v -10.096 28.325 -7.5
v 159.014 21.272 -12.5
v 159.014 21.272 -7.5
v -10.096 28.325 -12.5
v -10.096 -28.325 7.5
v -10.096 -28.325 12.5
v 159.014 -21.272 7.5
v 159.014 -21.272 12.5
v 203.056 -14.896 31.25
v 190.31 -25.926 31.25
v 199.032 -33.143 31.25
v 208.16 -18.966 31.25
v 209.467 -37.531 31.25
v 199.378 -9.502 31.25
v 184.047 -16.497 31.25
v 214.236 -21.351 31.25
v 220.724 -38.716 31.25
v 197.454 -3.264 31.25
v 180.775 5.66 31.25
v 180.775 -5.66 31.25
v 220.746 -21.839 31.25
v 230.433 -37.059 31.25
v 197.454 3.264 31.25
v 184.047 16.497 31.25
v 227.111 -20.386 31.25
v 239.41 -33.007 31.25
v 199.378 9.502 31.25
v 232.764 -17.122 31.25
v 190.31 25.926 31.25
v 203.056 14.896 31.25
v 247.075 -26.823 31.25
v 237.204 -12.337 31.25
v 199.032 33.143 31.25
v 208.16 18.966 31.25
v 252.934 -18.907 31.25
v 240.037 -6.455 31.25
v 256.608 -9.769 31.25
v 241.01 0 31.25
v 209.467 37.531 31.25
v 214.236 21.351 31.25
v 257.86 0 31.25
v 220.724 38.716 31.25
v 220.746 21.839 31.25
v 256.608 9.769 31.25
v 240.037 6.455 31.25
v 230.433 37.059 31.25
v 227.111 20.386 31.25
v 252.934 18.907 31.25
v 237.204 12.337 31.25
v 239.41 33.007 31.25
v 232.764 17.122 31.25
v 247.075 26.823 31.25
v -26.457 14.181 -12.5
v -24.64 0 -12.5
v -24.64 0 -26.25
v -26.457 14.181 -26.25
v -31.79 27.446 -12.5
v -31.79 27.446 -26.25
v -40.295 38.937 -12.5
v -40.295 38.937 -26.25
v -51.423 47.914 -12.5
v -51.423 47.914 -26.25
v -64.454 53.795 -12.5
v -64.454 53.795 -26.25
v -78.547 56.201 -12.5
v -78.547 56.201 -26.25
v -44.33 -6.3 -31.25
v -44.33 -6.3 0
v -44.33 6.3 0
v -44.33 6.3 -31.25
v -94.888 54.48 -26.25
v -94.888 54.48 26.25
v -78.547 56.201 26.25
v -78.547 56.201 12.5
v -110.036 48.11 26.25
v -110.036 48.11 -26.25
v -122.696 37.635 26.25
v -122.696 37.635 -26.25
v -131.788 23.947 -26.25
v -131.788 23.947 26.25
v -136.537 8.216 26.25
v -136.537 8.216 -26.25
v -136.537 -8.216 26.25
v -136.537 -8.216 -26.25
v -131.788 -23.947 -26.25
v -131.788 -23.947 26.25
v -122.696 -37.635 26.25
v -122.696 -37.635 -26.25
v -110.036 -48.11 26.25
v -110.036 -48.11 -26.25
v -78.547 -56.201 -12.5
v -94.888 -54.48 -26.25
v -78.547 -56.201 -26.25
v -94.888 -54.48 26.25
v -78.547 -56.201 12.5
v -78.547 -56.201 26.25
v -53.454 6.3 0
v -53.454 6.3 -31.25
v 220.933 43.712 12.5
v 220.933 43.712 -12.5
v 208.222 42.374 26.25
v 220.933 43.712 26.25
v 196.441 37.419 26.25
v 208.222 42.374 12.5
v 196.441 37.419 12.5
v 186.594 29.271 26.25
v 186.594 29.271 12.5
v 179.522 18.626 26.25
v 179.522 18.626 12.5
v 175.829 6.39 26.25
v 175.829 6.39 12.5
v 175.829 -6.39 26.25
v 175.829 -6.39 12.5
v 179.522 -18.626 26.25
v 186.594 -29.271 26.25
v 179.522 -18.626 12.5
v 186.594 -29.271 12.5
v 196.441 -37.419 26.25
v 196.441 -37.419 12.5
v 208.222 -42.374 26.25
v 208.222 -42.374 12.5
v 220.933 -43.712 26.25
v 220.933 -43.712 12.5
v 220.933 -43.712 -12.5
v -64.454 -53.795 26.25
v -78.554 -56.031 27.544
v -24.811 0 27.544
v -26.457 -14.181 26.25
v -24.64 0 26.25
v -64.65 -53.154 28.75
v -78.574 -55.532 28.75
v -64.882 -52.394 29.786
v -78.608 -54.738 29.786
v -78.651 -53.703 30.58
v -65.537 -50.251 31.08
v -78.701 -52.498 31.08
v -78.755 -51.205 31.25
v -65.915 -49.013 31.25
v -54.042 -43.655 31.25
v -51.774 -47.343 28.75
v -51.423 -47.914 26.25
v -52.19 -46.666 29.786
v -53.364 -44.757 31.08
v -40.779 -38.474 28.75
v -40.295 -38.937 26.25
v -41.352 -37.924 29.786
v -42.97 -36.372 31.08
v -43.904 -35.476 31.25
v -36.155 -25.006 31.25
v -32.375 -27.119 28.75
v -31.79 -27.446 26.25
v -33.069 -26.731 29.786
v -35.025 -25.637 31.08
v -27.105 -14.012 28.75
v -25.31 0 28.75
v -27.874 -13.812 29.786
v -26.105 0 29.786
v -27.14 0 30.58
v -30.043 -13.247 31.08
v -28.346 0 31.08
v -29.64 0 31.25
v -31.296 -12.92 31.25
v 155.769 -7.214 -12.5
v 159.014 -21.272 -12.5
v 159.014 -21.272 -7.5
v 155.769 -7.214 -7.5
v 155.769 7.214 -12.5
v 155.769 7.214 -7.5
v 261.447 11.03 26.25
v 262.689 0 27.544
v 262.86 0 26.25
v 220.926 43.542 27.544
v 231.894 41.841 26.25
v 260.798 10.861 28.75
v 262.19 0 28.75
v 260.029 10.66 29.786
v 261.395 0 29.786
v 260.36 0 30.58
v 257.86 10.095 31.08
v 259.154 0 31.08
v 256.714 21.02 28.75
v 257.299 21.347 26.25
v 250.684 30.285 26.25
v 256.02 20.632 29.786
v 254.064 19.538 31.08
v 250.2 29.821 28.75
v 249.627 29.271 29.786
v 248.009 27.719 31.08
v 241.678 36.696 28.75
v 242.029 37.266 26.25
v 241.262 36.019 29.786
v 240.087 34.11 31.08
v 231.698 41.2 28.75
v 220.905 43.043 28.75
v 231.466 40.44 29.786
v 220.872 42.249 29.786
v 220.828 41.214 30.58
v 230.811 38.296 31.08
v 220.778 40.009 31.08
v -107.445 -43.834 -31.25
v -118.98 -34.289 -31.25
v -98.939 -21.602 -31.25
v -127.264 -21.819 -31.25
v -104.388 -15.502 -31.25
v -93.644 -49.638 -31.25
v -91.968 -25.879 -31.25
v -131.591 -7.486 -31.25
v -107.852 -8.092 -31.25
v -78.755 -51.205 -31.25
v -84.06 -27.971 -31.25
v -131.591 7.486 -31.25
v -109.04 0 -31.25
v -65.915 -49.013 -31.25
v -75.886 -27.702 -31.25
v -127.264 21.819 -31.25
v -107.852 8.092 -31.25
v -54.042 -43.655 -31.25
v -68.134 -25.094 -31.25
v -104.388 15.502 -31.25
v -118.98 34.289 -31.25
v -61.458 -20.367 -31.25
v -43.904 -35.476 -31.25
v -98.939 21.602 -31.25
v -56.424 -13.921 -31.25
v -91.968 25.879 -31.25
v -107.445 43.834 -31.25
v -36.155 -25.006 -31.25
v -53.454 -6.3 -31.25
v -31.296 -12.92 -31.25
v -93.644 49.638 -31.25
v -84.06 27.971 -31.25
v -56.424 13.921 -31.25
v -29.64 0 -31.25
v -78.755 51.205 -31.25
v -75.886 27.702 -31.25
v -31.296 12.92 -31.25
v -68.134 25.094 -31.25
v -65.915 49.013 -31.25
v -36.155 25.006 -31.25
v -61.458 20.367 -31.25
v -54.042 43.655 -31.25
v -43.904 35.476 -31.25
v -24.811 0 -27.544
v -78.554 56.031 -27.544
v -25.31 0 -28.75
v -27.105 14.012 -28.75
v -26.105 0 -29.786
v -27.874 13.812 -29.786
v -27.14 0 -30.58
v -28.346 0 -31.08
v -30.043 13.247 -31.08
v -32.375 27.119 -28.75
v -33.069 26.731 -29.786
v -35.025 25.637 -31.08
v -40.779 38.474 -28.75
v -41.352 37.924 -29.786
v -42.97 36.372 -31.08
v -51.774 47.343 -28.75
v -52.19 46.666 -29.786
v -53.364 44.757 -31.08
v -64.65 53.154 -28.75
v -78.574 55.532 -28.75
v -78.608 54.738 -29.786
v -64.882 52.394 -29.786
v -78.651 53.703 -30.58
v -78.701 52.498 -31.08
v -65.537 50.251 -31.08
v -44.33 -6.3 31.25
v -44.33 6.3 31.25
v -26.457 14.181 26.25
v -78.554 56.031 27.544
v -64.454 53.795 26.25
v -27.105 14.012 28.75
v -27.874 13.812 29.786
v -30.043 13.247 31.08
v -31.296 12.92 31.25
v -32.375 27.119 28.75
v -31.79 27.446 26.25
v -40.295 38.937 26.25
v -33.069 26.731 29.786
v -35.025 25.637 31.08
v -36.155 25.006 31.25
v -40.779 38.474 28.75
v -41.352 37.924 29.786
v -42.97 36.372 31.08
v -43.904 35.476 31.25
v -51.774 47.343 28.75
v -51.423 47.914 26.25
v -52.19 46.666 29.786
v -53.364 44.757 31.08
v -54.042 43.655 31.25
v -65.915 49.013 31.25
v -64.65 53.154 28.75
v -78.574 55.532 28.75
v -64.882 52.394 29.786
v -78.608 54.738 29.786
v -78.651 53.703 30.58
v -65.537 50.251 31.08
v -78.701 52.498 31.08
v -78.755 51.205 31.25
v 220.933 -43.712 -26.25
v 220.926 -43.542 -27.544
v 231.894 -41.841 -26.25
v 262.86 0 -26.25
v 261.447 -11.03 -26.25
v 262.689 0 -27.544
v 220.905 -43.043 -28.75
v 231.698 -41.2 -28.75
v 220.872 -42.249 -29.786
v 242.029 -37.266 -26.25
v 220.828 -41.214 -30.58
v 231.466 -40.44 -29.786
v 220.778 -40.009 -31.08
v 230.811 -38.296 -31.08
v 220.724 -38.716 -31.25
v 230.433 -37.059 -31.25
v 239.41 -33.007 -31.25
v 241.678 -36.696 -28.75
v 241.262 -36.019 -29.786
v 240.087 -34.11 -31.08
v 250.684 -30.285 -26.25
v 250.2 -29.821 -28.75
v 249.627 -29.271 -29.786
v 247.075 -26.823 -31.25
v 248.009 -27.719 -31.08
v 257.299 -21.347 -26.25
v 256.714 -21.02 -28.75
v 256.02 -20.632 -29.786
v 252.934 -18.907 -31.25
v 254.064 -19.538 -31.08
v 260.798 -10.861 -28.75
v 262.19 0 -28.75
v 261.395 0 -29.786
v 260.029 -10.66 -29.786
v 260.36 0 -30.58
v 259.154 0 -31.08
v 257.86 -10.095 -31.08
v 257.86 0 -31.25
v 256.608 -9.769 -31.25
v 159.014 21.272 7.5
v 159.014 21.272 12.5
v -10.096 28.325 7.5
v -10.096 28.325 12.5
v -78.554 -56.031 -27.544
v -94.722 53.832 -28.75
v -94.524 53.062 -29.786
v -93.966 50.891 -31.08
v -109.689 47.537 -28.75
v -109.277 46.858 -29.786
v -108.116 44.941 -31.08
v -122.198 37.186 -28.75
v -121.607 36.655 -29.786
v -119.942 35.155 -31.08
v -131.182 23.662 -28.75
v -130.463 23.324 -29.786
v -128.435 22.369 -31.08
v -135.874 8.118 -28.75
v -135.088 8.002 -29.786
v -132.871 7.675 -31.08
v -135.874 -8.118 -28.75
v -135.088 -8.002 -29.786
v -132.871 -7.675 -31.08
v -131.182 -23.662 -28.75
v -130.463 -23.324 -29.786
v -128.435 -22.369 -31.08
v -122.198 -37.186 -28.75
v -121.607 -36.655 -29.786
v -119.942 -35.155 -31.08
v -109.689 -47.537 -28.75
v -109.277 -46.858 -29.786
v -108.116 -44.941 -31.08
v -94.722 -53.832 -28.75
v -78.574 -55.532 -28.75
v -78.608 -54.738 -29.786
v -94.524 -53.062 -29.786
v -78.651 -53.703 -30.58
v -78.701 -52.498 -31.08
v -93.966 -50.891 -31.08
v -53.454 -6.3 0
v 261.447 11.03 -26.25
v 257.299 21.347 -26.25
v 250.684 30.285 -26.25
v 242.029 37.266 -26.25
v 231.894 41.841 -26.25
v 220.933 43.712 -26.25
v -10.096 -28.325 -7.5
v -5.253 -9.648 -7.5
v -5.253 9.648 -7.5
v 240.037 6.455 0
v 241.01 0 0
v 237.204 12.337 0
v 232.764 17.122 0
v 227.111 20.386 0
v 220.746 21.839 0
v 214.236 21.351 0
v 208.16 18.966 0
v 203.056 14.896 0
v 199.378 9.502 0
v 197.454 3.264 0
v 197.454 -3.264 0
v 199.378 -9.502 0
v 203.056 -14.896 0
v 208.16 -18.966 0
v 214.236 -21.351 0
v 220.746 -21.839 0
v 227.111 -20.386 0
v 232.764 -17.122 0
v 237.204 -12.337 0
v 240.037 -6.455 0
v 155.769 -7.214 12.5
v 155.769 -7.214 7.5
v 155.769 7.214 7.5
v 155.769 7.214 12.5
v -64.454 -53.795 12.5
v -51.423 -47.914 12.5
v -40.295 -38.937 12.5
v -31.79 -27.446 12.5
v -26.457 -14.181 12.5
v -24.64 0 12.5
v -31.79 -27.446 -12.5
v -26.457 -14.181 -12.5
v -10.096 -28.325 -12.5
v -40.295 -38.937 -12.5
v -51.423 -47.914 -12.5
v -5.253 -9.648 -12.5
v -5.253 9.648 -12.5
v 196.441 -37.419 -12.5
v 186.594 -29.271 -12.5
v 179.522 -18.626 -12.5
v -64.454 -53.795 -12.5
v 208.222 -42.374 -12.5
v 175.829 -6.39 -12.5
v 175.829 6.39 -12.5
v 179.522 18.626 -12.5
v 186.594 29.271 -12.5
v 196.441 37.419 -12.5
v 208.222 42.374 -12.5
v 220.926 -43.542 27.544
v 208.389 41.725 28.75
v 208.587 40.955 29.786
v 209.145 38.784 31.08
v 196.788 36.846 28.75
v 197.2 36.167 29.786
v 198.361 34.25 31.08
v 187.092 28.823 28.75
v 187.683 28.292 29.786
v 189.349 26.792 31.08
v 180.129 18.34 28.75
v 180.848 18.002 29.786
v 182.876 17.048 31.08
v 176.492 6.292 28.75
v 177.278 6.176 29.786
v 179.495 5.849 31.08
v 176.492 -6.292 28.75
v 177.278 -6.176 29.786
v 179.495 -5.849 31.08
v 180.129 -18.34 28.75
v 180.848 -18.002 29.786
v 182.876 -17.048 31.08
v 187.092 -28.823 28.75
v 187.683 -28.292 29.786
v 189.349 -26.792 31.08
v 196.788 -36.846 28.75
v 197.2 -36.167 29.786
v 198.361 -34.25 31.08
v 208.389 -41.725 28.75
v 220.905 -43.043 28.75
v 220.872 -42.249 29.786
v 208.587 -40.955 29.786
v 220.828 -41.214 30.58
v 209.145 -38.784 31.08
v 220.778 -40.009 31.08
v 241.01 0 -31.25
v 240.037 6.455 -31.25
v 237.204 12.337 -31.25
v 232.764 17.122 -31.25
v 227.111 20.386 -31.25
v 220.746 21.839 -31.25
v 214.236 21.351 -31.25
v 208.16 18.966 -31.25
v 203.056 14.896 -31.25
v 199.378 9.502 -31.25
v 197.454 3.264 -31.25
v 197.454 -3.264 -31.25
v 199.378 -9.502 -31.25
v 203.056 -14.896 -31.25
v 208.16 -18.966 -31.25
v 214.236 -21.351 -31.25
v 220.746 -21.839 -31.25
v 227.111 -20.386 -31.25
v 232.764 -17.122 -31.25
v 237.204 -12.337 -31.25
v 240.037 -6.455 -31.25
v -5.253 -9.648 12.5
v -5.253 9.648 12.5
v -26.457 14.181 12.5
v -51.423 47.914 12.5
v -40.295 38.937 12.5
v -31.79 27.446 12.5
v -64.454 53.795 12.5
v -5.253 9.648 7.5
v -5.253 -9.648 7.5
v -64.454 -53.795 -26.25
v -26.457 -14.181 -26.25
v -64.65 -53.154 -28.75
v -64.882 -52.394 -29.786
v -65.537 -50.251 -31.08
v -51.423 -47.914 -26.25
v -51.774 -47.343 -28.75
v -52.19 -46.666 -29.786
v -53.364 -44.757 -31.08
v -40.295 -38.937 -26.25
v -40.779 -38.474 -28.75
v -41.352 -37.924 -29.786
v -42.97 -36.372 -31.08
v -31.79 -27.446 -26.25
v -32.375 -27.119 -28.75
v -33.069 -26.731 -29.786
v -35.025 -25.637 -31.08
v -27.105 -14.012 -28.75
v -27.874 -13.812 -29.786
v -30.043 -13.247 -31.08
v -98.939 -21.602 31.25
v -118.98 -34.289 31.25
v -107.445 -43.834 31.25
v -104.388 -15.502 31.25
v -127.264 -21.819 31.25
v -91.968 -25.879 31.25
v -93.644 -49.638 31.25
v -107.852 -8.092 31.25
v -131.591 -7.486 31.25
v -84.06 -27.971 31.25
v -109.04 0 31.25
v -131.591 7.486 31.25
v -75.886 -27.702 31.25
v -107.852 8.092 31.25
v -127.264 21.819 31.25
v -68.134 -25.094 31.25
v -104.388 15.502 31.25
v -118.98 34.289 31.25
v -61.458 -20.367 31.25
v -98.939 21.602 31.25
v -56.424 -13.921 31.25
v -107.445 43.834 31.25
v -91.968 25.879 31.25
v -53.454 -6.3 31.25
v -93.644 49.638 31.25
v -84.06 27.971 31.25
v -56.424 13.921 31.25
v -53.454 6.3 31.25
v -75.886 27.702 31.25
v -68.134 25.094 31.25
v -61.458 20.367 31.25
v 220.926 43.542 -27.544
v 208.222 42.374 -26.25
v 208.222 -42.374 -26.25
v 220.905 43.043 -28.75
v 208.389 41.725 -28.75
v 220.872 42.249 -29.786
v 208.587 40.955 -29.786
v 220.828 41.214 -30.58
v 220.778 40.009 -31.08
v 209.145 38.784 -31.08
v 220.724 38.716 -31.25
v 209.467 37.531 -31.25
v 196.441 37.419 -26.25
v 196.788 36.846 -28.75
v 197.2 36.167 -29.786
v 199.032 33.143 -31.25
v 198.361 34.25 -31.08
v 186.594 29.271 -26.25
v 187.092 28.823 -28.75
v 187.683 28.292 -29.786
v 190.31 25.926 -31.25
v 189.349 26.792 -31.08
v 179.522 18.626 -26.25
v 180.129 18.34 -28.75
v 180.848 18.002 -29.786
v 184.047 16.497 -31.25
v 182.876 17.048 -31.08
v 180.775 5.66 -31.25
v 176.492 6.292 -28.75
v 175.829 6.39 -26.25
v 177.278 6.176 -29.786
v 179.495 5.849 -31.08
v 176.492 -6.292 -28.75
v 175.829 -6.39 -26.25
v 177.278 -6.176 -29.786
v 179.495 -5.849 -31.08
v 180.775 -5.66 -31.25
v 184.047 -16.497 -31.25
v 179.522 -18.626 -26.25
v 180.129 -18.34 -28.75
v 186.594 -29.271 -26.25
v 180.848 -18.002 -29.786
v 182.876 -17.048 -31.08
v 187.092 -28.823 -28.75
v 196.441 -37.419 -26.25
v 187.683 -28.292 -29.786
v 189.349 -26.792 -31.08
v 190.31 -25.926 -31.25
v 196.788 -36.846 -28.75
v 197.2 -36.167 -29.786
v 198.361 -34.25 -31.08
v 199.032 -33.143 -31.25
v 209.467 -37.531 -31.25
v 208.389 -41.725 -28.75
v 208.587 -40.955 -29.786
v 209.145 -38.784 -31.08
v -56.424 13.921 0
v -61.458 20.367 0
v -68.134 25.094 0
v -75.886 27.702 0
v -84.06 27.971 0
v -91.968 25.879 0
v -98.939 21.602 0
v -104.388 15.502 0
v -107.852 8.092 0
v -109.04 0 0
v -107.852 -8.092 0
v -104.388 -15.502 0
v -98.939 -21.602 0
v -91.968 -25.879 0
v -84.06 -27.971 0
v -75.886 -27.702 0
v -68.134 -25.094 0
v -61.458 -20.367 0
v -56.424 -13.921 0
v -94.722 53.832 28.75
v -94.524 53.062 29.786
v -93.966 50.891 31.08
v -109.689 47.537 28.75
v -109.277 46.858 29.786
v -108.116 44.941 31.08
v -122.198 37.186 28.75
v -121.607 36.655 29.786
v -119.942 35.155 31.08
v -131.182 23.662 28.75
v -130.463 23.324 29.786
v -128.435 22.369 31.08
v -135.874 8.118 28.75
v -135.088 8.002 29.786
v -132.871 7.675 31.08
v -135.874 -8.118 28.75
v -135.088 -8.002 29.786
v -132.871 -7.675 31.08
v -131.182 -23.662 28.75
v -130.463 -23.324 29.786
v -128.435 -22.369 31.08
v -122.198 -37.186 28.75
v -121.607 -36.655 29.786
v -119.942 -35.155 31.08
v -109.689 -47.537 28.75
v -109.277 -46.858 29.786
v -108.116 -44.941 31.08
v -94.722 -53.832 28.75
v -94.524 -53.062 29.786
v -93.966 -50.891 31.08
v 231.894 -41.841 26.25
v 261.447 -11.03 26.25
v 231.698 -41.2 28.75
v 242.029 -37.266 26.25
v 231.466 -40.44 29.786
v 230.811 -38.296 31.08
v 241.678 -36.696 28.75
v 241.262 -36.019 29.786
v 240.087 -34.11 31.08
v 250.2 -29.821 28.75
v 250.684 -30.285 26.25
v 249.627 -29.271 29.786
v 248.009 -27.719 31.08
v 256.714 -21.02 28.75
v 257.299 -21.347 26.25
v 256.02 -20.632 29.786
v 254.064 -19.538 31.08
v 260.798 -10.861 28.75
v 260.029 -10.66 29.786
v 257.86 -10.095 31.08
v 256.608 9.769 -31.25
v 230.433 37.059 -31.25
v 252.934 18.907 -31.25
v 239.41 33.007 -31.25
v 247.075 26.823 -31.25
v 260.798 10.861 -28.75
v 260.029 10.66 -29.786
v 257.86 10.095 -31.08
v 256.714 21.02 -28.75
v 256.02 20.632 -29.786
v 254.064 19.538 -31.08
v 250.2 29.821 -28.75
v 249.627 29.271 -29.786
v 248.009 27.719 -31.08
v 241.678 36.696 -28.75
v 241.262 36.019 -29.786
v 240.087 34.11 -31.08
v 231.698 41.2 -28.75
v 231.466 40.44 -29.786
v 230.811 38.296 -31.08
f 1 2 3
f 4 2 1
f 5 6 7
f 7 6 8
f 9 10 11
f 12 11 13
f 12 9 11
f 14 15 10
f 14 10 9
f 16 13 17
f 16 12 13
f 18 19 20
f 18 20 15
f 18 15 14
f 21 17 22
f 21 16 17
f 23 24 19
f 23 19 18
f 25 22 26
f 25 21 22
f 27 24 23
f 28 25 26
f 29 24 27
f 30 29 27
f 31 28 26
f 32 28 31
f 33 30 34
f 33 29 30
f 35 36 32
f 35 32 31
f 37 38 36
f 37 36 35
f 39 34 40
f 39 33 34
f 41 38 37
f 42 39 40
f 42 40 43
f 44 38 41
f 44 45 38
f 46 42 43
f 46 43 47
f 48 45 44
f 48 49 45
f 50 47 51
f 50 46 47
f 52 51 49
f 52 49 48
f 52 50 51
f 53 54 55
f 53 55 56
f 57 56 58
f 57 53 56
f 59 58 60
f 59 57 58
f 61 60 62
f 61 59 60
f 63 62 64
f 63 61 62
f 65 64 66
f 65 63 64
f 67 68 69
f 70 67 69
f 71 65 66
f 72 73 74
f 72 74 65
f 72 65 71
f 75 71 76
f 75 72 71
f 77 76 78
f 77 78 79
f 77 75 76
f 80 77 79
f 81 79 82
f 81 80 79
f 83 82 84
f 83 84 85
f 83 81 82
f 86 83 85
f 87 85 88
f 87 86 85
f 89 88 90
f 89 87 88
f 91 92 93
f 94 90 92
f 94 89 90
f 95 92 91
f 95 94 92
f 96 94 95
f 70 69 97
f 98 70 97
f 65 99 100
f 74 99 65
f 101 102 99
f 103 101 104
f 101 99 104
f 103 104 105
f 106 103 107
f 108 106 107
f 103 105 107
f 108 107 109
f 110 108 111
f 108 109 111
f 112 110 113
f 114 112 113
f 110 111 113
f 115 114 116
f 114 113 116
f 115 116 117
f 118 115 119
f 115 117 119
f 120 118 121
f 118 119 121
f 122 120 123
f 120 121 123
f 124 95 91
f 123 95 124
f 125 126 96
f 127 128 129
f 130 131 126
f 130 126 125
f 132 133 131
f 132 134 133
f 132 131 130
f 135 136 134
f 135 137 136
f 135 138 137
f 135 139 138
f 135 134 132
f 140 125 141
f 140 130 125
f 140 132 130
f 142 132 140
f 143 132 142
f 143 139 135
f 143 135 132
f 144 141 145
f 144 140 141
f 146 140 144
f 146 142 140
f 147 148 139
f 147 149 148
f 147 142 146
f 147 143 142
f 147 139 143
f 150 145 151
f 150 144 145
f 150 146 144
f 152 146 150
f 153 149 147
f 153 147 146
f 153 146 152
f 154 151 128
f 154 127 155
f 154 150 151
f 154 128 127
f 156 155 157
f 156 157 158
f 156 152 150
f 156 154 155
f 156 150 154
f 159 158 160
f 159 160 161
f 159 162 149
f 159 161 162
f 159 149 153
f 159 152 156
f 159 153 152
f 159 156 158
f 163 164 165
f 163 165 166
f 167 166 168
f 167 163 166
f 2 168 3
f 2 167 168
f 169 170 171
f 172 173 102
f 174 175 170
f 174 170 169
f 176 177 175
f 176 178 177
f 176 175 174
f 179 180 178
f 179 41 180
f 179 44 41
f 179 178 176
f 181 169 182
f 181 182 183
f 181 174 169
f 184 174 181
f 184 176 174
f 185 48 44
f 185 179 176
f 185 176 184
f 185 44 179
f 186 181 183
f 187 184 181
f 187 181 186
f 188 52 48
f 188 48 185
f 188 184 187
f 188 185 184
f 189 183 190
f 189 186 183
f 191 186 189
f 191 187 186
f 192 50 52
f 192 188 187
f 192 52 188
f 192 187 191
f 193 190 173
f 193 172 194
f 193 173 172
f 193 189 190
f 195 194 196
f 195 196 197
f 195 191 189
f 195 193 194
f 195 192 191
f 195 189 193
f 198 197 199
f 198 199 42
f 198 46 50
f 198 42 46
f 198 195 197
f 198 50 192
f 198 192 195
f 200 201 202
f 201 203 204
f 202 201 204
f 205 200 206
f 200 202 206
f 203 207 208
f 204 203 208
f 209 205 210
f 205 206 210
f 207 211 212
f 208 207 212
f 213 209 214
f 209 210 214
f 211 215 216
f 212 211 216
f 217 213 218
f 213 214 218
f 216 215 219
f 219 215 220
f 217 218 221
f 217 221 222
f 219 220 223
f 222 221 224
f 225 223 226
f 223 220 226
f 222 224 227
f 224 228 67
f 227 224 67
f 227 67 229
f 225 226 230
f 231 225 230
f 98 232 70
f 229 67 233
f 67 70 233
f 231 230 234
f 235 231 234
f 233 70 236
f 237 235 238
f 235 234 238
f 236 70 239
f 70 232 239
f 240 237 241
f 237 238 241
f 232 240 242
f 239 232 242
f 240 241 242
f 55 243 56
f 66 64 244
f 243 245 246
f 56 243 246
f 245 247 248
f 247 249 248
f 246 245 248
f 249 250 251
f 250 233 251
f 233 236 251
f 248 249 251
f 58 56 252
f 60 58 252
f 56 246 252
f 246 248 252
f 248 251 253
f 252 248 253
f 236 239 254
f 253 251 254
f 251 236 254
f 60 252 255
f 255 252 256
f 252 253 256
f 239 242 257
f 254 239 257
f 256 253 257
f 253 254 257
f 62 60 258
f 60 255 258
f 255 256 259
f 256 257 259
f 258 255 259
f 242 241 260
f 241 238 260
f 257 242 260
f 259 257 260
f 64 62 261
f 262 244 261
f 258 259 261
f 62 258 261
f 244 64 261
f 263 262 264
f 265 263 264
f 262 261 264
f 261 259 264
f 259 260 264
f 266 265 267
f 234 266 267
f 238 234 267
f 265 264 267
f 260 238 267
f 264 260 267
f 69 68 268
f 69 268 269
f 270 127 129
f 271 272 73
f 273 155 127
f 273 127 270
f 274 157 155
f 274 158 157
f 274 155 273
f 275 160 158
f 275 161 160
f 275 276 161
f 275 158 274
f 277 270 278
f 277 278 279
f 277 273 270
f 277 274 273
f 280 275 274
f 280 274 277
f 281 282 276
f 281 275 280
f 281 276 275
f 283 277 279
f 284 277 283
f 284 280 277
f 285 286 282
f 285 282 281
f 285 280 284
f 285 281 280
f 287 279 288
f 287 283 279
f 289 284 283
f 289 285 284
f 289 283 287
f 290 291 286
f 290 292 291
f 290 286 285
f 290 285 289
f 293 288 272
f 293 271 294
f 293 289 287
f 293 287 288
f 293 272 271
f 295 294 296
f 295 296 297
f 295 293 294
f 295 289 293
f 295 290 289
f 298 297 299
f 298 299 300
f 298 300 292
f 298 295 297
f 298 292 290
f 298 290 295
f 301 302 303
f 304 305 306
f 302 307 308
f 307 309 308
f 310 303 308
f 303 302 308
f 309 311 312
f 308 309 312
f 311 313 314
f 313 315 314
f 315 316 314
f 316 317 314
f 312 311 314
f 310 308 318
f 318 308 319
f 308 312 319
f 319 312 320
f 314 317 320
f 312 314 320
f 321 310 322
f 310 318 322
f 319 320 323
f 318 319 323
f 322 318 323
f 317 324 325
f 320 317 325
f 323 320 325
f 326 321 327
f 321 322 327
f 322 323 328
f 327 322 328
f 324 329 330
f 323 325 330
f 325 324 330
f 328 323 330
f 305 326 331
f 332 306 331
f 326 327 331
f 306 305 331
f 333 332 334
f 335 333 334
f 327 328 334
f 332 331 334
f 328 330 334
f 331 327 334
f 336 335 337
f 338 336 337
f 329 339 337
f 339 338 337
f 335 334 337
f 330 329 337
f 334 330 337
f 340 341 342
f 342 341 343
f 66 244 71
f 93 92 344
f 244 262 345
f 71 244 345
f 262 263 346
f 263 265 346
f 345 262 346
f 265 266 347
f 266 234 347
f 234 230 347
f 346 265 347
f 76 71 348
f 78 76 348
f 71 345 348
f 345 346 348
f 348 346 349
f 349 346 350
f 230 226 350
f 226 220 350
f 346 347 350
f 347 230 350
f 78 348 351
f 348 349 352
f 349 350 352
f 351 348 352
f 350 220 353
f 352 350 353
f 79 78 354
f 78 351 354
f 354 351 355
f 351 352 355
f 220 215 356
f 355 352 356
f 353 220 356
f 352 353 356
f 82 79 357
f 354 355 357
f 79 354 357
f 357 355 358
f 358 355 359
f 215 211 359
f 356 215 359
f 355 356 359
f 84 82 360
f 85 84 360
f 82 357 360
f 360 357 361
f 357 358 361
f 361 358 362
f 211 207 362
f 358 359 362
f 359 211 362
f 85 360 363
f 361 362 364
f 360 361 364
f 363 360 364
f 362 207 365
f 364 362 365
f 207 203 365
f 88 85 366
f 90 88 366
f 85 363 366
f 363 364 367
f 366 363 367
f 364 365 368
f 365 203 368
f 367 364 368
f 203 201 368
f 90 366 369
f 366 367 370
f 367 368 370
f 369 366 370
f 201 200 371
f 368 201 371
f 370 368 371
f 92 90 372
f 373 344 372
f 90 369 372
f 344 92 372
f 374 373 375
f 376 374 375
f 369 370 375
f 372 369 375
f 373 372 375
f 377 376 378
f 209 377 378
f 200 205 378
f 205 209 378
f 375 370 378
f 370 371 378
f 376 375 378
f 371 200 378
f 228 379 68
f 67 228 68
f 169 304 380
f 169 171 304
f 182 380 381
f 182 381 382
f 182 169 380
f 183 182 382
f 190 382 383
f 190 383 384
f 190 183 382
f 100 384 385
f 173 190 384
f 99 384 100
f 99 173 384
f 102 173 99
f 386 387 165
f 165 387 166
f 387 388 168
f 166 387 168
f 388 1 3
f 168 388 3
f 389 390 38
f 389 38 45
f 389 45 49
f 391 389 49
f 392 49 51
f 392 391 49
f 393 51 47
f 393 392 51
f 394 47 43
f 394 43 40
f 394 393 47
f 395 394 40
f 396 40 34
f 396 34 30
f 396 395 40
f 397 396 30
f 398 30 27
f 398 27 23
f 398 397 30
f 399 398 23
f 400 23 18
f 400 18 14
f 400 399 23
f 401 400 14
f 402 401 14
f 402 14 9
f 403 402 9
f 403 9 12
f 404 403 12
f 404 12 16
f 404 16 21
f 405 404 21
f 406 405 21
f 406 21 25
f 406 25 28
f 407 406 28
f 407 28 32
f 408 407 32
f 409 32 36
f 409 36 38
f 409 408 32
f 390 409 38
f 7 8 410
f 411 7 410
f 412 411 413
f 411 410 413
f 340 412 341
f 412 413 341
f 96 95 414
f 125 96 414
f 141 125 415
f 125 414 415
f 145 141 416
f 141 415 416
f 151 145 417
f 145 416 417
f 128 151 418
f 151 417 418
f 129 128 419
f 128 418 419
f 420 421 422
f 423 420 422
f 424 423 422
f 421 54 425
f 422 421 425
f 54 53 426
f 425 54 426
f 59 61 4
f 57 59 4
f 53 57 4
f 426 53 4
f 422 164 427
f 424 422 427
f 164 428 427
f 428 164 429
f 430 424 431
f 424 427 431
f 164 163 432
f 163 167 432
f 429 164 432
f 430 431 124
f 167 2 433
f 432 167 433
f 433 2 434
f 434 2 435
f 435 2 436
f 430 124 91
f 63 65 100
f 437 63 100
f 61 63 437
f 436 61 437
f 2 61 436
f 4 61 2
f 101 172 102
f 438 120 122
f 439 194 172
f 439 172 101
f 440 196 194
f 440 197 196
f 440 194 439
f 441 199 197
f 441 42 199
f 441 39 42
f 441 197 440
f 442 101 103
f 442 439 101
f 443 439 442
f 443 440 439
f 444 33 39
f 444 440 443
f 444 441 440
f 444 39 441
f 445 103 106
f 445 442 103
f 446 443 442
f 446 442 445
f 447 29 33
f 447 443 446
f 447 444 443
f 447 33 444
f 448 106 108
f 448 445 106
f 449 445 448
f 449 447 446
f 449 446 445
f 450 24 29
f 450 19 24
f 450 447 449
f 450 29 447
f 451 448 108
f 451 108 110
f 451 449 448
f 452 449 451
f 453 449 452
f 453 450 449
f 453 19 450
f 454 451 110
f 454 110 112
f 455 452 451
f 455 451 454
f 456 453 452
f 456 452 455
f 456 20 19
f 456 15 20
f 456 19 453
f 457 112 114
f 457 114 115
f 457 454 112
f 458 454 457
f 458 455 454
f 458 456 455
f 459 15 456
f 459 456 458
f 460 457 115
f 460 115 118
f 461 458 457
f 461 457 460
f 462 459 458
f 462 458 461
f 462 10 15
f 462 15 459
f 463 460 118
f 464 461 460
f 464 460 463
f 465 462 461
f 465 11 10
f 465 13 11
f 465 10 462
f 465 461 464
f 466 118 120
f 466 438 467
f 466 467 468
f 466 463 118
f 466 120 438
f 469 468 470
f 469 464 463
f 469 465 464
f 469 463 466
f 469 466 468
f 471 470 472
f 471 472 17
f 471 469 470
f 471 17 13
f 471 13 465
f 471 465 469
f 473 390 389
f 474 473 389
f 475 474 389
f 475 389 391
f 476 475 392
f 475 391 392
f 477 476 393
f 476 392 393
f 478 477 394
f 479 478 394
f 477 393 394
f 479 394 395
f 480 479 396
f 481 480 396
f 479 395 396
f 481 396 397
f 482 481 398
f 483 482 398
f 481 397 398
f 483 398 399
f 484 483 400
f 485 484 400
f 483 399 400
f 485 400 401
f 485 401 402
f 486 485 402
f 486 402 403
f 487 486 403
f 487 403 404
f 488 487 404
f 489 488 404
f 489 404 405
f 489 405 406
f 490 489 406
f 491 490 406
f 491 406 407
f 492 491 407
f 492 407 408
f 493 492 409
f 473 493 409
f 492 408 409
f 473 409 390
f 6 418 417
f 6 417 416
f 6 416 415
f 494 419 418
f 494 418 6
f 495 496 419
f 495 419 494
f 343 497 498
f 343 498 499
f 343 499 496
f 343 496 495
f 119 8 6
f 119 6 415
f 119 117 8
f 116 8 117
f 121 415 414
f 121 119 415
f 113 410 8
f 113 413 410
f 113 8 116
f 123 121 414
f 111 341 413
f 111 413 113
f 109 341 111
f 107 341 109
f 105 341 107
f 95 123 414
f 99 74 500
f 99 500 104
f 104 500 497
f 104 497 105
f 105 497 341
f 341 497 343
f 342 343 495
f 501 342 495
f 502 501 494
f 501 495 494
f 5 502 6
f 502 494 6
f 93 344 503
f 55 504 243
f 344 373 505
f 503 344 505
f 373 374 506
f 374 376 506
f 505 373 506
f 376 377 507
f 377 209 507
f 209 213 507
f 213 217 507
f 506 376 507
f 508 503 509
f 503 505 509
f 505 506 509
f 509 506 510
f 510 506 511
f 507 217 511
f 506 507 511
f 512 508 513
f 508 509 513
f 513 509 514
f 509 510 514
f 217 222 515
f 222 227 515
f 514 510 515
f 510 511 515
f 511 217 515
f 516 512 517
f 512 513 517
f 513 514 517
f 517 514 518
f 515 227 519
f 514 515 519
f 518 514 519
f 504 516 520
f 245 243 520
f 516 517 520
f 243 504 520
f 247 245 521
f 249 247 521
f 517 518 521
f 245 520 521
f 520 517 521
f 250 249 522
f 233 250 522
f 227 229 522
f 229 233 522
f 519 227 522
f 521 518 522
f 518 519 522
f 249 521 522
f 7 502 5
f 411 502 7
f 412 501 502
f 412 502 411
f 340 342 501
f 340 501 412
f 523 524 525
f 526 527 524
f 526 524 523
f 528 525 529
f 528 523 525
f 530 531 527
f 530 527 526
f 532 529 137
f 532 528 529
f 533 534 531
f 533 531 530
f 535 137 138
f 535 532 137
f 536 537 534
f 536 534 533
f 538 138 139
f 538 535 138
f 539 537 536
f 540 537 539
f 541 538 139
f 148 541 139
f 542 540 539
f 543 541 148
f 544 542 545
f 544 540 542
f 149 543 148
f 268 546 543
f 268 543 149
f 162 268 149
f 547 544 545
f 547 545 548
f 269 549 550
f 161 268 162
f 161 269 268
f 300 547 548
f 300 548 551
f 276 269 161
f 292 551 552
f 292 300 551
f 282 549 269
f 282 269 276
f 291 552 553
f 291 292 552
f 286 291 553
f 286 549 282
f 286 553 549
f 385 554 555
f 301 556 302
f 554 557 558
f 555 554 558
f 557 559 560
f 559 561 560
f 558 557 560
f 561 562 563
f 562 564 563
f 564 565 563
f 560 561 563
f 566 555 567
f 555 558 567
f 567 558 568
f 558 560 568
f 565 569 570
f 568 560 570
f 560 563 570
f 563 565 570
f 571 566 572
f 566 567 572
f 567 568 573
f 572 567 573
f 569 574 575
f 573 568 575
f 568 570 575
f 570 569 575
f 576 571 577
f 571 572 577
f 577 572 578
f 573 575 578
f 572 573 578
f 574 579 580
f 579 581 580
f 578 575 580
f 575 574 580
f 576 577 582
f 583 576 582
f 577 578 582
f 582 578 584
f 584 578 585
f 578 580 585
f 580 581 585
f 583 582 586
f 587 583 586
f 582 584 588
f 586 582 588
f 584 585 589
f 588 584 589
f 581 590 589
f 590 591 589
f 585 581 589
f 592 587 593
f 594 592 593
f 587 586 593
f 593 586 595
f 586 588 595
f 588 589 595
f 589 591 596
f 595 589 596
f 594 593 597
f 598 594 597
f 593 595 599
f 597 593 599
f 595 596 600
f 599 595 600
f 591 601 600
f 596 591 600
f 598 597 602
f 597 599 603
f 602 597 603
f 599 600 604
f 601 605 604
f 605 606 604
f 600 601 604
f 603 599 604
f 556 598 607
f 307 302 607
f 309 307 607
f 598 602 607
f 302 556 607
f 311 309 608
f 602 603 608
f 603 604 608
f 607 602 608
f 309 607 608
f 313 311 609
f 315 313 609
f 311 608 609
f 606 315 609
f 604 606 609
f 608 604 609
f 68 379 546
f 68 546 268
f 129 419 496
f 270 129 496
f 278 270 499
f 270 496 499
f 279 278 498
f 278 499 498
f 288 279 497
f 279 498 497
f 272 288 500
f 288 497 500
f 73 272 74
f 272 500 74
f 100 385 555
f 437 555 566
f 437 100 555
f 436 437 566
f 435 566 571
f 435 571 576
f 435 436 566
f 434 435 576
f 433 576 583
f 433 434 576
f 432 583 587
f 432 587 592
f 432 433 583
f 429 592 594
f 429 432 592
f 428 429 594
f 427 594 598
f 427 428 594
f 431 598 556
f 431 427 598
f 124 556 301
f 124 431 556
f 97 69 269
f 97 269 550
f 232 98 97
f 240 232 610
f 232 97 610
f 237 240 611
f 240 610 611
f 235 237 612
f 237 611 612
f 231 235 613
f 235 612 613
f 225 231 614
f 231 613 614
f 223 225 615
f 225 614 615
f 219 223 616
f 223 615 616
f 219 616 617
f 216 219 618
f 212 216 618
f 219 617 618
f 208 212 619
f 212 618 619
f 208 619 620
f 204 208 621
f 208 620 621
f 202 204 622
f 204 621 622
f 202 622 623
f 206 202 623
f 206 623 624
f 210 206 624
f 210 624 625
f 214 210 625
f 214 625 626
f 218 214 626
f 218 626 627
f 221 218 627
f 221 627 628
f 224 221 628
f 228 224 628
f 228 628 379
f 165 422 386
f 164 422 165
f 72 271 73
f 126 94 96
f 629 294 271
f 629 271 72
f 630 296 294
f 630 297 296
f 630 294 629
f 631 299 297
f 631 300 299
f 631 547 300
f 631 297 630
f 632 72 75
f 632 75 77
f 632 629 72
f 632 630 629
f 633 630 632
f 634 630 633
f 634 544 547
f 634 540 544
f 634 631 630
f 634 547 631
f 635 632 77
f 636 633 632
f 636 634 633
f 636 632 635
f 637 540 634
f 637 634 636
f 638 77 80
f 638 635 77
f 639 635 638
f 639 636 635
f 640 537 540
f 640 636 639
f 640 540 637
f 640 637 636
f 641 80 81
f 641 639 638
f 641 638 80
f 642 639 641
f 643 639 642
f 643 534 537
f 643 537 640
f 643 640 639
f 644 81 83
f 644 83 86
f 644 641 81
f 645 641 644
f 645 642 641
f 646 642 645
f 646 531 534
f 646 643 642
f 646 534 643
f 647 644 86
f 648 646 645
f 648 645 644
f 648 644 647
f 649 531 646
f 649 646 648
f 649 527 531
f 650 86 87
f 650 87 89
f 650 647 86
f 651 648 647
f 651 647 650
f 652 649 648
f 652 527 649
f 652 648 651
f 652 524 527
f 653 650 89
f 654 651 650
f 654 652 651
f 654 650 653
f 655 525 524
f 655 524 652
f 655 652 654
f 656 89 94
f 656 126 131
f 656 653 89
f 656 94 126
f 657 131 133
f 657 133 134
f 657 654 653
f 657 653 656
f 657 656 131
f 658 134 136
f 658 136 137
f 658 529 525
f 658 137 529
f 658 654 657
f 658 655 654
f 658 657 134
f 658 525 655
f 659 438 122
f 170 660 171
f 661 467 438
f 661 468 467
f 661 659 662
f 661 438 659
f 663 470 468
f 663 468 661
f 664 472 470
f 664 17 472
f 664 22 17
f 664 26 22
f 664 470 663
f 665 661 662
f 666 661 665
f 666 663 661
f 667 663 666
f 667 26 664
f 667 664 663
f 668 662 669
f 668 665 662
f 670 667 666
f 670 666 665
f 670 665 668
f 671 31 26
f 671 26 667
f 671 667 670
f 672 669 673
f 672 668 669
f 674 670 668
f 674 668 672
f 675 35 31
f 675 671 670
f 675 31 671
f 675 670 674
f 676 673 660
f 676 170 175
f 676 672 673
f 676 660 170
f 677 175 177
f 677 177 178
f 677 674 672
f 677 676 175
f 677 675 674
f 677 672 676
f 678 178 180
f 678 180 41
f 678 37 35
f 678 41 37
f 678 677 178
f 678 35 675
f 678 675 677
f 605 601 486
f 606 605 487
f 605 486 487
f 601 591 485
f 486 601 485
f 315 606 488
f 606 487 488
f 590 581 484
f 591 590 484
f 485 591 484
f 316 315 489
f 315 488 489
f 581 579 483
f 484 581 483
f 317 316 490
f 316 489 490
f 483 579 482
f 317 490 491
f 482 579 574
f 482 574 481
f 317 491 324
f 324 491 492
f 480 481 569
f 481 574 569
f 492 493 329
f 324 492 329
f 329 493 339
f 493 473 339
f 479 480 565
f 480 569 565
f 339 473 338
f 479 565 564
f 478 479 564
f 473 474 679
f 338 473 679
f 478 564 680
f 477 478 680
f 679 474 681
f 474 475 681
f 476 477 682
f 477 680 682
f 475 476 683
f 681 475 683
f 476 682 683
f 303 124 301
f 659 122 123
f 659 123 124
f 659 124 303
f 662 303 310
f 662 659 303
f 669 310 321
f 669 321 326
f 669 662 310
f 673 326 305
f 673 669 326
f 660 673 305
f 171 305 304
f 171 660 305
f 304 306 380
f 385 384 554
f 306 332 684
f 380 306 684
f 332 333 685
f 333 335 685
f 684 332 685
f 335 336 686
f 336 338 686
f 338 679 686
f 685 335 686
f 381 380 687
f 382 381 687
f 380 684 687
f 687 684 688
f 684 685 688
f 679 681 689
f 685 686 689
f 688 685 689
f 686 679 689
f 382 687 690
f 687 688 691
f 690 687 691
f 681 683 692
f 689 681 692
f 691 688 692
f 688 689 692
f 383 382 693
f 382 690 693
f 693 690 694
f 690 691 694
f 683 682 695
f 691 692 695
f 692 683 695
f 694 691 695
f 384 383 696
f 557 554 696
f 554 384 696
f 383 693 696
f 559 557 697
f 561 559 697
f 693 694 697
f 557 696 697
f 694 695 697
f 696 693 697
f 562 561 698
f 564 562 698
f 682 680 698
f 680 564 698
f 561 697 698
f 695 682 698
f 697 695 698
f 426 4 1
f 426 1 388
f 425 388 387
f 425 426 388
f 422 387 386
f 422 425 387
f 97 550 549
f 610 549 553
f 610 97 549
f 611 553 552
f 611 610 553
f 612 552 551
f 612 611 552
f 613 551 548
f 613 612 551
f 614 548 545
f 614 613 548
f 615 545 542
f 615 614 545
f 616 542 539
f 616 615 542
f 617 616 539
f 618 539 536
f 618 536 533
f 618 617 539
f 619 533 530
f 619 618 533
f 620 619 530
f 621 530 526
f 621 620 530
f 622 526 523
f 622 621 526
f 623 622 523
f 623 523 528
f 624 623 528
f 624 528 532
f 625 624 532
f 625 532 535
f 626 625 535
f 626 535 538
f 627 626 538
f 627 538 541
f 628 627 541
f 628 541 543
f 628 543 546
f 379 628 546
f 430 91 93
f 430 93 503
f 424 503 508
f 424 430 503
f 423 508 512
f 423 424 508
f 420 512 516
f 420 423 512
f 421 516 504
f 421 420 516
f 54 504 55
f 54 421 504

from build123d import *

# Parameters (mm, degrees)
F6_DEPTH = 12.5
F0_R     = 21.9
F0_R_2   = 28.15
F1_DEPTH = 31.25
F2_DEPTH = 5
F4_DEPTH = 130.647779
F5_R     = 5


with BuildPart() as f6:
    # F0 (on Top) → F6 (new body)
    with BuildSketch(Plane.XY):
        with BuildLine():
            ThreePointArc((-78.54655, 56.201151), (-40.29536, 38.937299), (-24.6403, 0))
            ThreePointArc((-24.6403, 0), (-40.29536, -38.937299), (-78.54655, -56.201151))
            Line((-78.54655, -56.201151), (220.932616, -43.712006))
            ThreePointArc((220.932616, -43.712006), (175.3597, 0), (220.932616, 43.712006))
            Line((220.932616, 43.712006), (-78.54655, 56.201151))
        make_face()
    extrude(amount=F6_DEPTH)

    # F0 (on Top) → F1 (join)
    with BuildSketch(Plane.XY):
        with BuildLine():
            ThreePointArc((262.8597, 0), (250.683543, 30.284566), (220.932616, 43.712006))
            ThreePointArc((220.932616, 43.712006), (175.3597, 0), (220.932616, -43.712006))
            ThreePointArc((220.932616, -43.712006), (250.683543, -30.284566), (262.8597, 0))
        make_face()
        with Locations((219.1097, 0)):
            Circle(F0_R, mode=Mode.SUBTRACT)
        with BuildLine():
            ThreePointArc((-78.54655, -56.201151), (-40.29536, -38.937299), (-24.6403, 0))
            ThreePointArc((-24.6403, 0), (-40.29536, 38.937299), (-78.54655, 56.201151))
            ThreePointArc((-78.54655, 56.201151), (-137.1403, 0), (-78.54655, -56.201151))
        make_face()
        with Locations((-80.8903, 0)):
            Circle(F0_R_2, mode=Mode.SUBTRACT)
    extrude(amount=F1_DEPTH)

    # F7 (on face) → F2 (cut)
    with BuildSketch(Plane.XY.offset(12.5)):
        with BuildLine():
            ThreePointArc((159.013575, -21.272479), (155.3597, 0), (159.013575, 21.272479))
            Line((159.013575, 21.272479), (-10.09648, 28.324856))
            ThreePointArc((-10.09648, 28.324856), (-4.6403, 0), (-10.09648, -28.324856))
            Line((-10.09648, -28.324856), (159.013575, -21.272479))
        make_face()
    extrude(amount=-F2_DEPTH, mode=Mode.SUBTRACT)

    # F3 (on face) → F4 (cut)
    with BuildSketch(Plane.XY.offset(31.25)):
        Polygon((-44.3303, 6.3), (-80.8903, 6.3), (-80.8903, 0), (-80.8903, -6.3), (-44.3303, -6.3), (-44.3303, 0), align=None)
    extrude(amount=-F4_DEPTH, mode=Mode.SUBTRACT)

    # F5
    f5_edges = [f6.edges().sort_by_distance(p)[0] for p in [
        (-83.23405, 56.201151, 31.25),
        (217.286783, 43.712006, 31.25),
    ]]
    fillet(f5_edges, radius=F5_R)

    # F8: F6 across face


with BuildPart() as f6_1:
    add(f6.part)
    add(f6.part.mirror(Plane(origin=(57.759203, 0, 0), x_dir=(1, 0, 0), z_dir=(0, 0, -1))))


solid = f6_1.part
